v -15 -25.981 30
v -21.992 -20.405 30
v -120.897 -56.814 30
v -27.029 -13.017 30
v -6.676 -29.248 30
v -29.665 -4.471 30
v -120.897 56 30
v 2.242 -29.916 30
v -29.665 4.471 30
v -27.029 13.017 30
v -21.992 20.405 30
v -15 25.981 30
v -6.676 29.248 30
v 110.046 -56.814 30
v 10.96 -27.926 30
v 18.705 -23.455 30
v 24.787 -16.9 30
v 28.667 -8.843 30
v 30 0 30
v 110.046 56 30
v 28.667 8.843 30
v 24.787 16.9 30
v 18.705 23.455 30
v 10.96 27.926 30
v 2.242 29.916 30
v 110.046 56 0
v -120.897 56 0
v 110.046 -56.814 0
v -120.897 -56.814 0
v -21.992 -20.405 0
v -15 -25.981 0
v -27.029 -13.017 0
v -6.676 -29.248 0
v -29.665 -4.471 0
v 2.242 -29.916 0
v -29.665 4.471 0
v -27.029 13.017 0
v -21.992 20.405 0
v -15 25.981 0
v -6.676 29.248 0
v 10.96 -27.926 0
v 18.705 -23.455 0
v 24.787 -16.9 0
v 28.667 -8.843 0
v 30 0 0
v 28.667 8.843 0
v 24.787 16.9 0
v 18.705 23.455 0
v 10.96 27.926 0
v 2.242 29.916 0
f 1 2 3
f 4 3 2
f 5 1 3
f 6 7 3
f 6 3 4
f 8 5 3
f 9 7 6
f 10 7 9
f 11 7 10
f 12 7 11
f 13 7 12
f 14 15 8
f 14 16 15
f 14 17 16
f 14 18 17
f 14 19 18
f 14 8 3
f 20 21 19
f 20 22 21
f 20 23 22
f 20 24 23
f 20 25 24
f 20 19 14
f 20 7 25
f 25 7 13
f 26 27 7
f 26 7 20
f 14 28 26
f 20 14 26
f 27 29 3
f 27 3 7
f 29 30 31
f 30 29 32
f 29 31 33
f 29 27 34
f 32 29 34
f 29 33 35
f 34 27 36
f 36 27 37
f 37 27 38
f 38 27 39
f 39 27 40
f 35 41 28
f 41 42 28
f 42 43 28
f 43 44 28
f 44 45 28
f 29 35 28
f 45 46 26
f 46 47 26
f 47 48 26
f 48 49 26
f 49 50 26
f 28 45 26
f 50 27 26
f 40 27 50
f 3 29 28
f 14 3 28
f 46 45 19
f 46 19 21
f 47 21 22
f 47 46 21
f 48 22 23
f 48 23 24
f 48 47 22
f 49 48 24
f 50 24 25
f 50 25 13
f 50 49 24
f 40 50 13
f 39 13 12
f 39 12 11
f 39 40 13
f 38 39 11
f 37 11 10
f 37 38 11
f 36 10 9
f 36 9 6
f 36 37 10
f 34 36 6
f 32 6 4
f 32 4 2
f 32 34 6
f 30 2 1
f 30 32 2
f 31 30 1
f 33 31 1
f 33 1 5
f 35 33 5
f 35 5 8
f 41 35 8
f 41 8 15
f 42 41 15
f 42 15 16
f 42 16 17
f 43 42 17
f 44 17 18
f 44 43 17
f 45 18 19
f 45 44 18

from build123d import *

# Parameters (mm, degrees)
SKETCH_W  = 230.942398
SKETCH_H  = 112.814285
SKETCH_R  = 30
PAD_DEPTH = 30


with BuildPart() as part:
    # Sketch → Pad (new body)
    with BuildSketch(Plane.XY):
        with Locations((-5.425507, -0.407142)):
            Rectangle(SKETCH_W, SKETCH_H)
        Circle(SKETCH_R, mode=Mode.SUBTRACT)
    extrude(amount=PAD_DEPTH)


solid = part.part
